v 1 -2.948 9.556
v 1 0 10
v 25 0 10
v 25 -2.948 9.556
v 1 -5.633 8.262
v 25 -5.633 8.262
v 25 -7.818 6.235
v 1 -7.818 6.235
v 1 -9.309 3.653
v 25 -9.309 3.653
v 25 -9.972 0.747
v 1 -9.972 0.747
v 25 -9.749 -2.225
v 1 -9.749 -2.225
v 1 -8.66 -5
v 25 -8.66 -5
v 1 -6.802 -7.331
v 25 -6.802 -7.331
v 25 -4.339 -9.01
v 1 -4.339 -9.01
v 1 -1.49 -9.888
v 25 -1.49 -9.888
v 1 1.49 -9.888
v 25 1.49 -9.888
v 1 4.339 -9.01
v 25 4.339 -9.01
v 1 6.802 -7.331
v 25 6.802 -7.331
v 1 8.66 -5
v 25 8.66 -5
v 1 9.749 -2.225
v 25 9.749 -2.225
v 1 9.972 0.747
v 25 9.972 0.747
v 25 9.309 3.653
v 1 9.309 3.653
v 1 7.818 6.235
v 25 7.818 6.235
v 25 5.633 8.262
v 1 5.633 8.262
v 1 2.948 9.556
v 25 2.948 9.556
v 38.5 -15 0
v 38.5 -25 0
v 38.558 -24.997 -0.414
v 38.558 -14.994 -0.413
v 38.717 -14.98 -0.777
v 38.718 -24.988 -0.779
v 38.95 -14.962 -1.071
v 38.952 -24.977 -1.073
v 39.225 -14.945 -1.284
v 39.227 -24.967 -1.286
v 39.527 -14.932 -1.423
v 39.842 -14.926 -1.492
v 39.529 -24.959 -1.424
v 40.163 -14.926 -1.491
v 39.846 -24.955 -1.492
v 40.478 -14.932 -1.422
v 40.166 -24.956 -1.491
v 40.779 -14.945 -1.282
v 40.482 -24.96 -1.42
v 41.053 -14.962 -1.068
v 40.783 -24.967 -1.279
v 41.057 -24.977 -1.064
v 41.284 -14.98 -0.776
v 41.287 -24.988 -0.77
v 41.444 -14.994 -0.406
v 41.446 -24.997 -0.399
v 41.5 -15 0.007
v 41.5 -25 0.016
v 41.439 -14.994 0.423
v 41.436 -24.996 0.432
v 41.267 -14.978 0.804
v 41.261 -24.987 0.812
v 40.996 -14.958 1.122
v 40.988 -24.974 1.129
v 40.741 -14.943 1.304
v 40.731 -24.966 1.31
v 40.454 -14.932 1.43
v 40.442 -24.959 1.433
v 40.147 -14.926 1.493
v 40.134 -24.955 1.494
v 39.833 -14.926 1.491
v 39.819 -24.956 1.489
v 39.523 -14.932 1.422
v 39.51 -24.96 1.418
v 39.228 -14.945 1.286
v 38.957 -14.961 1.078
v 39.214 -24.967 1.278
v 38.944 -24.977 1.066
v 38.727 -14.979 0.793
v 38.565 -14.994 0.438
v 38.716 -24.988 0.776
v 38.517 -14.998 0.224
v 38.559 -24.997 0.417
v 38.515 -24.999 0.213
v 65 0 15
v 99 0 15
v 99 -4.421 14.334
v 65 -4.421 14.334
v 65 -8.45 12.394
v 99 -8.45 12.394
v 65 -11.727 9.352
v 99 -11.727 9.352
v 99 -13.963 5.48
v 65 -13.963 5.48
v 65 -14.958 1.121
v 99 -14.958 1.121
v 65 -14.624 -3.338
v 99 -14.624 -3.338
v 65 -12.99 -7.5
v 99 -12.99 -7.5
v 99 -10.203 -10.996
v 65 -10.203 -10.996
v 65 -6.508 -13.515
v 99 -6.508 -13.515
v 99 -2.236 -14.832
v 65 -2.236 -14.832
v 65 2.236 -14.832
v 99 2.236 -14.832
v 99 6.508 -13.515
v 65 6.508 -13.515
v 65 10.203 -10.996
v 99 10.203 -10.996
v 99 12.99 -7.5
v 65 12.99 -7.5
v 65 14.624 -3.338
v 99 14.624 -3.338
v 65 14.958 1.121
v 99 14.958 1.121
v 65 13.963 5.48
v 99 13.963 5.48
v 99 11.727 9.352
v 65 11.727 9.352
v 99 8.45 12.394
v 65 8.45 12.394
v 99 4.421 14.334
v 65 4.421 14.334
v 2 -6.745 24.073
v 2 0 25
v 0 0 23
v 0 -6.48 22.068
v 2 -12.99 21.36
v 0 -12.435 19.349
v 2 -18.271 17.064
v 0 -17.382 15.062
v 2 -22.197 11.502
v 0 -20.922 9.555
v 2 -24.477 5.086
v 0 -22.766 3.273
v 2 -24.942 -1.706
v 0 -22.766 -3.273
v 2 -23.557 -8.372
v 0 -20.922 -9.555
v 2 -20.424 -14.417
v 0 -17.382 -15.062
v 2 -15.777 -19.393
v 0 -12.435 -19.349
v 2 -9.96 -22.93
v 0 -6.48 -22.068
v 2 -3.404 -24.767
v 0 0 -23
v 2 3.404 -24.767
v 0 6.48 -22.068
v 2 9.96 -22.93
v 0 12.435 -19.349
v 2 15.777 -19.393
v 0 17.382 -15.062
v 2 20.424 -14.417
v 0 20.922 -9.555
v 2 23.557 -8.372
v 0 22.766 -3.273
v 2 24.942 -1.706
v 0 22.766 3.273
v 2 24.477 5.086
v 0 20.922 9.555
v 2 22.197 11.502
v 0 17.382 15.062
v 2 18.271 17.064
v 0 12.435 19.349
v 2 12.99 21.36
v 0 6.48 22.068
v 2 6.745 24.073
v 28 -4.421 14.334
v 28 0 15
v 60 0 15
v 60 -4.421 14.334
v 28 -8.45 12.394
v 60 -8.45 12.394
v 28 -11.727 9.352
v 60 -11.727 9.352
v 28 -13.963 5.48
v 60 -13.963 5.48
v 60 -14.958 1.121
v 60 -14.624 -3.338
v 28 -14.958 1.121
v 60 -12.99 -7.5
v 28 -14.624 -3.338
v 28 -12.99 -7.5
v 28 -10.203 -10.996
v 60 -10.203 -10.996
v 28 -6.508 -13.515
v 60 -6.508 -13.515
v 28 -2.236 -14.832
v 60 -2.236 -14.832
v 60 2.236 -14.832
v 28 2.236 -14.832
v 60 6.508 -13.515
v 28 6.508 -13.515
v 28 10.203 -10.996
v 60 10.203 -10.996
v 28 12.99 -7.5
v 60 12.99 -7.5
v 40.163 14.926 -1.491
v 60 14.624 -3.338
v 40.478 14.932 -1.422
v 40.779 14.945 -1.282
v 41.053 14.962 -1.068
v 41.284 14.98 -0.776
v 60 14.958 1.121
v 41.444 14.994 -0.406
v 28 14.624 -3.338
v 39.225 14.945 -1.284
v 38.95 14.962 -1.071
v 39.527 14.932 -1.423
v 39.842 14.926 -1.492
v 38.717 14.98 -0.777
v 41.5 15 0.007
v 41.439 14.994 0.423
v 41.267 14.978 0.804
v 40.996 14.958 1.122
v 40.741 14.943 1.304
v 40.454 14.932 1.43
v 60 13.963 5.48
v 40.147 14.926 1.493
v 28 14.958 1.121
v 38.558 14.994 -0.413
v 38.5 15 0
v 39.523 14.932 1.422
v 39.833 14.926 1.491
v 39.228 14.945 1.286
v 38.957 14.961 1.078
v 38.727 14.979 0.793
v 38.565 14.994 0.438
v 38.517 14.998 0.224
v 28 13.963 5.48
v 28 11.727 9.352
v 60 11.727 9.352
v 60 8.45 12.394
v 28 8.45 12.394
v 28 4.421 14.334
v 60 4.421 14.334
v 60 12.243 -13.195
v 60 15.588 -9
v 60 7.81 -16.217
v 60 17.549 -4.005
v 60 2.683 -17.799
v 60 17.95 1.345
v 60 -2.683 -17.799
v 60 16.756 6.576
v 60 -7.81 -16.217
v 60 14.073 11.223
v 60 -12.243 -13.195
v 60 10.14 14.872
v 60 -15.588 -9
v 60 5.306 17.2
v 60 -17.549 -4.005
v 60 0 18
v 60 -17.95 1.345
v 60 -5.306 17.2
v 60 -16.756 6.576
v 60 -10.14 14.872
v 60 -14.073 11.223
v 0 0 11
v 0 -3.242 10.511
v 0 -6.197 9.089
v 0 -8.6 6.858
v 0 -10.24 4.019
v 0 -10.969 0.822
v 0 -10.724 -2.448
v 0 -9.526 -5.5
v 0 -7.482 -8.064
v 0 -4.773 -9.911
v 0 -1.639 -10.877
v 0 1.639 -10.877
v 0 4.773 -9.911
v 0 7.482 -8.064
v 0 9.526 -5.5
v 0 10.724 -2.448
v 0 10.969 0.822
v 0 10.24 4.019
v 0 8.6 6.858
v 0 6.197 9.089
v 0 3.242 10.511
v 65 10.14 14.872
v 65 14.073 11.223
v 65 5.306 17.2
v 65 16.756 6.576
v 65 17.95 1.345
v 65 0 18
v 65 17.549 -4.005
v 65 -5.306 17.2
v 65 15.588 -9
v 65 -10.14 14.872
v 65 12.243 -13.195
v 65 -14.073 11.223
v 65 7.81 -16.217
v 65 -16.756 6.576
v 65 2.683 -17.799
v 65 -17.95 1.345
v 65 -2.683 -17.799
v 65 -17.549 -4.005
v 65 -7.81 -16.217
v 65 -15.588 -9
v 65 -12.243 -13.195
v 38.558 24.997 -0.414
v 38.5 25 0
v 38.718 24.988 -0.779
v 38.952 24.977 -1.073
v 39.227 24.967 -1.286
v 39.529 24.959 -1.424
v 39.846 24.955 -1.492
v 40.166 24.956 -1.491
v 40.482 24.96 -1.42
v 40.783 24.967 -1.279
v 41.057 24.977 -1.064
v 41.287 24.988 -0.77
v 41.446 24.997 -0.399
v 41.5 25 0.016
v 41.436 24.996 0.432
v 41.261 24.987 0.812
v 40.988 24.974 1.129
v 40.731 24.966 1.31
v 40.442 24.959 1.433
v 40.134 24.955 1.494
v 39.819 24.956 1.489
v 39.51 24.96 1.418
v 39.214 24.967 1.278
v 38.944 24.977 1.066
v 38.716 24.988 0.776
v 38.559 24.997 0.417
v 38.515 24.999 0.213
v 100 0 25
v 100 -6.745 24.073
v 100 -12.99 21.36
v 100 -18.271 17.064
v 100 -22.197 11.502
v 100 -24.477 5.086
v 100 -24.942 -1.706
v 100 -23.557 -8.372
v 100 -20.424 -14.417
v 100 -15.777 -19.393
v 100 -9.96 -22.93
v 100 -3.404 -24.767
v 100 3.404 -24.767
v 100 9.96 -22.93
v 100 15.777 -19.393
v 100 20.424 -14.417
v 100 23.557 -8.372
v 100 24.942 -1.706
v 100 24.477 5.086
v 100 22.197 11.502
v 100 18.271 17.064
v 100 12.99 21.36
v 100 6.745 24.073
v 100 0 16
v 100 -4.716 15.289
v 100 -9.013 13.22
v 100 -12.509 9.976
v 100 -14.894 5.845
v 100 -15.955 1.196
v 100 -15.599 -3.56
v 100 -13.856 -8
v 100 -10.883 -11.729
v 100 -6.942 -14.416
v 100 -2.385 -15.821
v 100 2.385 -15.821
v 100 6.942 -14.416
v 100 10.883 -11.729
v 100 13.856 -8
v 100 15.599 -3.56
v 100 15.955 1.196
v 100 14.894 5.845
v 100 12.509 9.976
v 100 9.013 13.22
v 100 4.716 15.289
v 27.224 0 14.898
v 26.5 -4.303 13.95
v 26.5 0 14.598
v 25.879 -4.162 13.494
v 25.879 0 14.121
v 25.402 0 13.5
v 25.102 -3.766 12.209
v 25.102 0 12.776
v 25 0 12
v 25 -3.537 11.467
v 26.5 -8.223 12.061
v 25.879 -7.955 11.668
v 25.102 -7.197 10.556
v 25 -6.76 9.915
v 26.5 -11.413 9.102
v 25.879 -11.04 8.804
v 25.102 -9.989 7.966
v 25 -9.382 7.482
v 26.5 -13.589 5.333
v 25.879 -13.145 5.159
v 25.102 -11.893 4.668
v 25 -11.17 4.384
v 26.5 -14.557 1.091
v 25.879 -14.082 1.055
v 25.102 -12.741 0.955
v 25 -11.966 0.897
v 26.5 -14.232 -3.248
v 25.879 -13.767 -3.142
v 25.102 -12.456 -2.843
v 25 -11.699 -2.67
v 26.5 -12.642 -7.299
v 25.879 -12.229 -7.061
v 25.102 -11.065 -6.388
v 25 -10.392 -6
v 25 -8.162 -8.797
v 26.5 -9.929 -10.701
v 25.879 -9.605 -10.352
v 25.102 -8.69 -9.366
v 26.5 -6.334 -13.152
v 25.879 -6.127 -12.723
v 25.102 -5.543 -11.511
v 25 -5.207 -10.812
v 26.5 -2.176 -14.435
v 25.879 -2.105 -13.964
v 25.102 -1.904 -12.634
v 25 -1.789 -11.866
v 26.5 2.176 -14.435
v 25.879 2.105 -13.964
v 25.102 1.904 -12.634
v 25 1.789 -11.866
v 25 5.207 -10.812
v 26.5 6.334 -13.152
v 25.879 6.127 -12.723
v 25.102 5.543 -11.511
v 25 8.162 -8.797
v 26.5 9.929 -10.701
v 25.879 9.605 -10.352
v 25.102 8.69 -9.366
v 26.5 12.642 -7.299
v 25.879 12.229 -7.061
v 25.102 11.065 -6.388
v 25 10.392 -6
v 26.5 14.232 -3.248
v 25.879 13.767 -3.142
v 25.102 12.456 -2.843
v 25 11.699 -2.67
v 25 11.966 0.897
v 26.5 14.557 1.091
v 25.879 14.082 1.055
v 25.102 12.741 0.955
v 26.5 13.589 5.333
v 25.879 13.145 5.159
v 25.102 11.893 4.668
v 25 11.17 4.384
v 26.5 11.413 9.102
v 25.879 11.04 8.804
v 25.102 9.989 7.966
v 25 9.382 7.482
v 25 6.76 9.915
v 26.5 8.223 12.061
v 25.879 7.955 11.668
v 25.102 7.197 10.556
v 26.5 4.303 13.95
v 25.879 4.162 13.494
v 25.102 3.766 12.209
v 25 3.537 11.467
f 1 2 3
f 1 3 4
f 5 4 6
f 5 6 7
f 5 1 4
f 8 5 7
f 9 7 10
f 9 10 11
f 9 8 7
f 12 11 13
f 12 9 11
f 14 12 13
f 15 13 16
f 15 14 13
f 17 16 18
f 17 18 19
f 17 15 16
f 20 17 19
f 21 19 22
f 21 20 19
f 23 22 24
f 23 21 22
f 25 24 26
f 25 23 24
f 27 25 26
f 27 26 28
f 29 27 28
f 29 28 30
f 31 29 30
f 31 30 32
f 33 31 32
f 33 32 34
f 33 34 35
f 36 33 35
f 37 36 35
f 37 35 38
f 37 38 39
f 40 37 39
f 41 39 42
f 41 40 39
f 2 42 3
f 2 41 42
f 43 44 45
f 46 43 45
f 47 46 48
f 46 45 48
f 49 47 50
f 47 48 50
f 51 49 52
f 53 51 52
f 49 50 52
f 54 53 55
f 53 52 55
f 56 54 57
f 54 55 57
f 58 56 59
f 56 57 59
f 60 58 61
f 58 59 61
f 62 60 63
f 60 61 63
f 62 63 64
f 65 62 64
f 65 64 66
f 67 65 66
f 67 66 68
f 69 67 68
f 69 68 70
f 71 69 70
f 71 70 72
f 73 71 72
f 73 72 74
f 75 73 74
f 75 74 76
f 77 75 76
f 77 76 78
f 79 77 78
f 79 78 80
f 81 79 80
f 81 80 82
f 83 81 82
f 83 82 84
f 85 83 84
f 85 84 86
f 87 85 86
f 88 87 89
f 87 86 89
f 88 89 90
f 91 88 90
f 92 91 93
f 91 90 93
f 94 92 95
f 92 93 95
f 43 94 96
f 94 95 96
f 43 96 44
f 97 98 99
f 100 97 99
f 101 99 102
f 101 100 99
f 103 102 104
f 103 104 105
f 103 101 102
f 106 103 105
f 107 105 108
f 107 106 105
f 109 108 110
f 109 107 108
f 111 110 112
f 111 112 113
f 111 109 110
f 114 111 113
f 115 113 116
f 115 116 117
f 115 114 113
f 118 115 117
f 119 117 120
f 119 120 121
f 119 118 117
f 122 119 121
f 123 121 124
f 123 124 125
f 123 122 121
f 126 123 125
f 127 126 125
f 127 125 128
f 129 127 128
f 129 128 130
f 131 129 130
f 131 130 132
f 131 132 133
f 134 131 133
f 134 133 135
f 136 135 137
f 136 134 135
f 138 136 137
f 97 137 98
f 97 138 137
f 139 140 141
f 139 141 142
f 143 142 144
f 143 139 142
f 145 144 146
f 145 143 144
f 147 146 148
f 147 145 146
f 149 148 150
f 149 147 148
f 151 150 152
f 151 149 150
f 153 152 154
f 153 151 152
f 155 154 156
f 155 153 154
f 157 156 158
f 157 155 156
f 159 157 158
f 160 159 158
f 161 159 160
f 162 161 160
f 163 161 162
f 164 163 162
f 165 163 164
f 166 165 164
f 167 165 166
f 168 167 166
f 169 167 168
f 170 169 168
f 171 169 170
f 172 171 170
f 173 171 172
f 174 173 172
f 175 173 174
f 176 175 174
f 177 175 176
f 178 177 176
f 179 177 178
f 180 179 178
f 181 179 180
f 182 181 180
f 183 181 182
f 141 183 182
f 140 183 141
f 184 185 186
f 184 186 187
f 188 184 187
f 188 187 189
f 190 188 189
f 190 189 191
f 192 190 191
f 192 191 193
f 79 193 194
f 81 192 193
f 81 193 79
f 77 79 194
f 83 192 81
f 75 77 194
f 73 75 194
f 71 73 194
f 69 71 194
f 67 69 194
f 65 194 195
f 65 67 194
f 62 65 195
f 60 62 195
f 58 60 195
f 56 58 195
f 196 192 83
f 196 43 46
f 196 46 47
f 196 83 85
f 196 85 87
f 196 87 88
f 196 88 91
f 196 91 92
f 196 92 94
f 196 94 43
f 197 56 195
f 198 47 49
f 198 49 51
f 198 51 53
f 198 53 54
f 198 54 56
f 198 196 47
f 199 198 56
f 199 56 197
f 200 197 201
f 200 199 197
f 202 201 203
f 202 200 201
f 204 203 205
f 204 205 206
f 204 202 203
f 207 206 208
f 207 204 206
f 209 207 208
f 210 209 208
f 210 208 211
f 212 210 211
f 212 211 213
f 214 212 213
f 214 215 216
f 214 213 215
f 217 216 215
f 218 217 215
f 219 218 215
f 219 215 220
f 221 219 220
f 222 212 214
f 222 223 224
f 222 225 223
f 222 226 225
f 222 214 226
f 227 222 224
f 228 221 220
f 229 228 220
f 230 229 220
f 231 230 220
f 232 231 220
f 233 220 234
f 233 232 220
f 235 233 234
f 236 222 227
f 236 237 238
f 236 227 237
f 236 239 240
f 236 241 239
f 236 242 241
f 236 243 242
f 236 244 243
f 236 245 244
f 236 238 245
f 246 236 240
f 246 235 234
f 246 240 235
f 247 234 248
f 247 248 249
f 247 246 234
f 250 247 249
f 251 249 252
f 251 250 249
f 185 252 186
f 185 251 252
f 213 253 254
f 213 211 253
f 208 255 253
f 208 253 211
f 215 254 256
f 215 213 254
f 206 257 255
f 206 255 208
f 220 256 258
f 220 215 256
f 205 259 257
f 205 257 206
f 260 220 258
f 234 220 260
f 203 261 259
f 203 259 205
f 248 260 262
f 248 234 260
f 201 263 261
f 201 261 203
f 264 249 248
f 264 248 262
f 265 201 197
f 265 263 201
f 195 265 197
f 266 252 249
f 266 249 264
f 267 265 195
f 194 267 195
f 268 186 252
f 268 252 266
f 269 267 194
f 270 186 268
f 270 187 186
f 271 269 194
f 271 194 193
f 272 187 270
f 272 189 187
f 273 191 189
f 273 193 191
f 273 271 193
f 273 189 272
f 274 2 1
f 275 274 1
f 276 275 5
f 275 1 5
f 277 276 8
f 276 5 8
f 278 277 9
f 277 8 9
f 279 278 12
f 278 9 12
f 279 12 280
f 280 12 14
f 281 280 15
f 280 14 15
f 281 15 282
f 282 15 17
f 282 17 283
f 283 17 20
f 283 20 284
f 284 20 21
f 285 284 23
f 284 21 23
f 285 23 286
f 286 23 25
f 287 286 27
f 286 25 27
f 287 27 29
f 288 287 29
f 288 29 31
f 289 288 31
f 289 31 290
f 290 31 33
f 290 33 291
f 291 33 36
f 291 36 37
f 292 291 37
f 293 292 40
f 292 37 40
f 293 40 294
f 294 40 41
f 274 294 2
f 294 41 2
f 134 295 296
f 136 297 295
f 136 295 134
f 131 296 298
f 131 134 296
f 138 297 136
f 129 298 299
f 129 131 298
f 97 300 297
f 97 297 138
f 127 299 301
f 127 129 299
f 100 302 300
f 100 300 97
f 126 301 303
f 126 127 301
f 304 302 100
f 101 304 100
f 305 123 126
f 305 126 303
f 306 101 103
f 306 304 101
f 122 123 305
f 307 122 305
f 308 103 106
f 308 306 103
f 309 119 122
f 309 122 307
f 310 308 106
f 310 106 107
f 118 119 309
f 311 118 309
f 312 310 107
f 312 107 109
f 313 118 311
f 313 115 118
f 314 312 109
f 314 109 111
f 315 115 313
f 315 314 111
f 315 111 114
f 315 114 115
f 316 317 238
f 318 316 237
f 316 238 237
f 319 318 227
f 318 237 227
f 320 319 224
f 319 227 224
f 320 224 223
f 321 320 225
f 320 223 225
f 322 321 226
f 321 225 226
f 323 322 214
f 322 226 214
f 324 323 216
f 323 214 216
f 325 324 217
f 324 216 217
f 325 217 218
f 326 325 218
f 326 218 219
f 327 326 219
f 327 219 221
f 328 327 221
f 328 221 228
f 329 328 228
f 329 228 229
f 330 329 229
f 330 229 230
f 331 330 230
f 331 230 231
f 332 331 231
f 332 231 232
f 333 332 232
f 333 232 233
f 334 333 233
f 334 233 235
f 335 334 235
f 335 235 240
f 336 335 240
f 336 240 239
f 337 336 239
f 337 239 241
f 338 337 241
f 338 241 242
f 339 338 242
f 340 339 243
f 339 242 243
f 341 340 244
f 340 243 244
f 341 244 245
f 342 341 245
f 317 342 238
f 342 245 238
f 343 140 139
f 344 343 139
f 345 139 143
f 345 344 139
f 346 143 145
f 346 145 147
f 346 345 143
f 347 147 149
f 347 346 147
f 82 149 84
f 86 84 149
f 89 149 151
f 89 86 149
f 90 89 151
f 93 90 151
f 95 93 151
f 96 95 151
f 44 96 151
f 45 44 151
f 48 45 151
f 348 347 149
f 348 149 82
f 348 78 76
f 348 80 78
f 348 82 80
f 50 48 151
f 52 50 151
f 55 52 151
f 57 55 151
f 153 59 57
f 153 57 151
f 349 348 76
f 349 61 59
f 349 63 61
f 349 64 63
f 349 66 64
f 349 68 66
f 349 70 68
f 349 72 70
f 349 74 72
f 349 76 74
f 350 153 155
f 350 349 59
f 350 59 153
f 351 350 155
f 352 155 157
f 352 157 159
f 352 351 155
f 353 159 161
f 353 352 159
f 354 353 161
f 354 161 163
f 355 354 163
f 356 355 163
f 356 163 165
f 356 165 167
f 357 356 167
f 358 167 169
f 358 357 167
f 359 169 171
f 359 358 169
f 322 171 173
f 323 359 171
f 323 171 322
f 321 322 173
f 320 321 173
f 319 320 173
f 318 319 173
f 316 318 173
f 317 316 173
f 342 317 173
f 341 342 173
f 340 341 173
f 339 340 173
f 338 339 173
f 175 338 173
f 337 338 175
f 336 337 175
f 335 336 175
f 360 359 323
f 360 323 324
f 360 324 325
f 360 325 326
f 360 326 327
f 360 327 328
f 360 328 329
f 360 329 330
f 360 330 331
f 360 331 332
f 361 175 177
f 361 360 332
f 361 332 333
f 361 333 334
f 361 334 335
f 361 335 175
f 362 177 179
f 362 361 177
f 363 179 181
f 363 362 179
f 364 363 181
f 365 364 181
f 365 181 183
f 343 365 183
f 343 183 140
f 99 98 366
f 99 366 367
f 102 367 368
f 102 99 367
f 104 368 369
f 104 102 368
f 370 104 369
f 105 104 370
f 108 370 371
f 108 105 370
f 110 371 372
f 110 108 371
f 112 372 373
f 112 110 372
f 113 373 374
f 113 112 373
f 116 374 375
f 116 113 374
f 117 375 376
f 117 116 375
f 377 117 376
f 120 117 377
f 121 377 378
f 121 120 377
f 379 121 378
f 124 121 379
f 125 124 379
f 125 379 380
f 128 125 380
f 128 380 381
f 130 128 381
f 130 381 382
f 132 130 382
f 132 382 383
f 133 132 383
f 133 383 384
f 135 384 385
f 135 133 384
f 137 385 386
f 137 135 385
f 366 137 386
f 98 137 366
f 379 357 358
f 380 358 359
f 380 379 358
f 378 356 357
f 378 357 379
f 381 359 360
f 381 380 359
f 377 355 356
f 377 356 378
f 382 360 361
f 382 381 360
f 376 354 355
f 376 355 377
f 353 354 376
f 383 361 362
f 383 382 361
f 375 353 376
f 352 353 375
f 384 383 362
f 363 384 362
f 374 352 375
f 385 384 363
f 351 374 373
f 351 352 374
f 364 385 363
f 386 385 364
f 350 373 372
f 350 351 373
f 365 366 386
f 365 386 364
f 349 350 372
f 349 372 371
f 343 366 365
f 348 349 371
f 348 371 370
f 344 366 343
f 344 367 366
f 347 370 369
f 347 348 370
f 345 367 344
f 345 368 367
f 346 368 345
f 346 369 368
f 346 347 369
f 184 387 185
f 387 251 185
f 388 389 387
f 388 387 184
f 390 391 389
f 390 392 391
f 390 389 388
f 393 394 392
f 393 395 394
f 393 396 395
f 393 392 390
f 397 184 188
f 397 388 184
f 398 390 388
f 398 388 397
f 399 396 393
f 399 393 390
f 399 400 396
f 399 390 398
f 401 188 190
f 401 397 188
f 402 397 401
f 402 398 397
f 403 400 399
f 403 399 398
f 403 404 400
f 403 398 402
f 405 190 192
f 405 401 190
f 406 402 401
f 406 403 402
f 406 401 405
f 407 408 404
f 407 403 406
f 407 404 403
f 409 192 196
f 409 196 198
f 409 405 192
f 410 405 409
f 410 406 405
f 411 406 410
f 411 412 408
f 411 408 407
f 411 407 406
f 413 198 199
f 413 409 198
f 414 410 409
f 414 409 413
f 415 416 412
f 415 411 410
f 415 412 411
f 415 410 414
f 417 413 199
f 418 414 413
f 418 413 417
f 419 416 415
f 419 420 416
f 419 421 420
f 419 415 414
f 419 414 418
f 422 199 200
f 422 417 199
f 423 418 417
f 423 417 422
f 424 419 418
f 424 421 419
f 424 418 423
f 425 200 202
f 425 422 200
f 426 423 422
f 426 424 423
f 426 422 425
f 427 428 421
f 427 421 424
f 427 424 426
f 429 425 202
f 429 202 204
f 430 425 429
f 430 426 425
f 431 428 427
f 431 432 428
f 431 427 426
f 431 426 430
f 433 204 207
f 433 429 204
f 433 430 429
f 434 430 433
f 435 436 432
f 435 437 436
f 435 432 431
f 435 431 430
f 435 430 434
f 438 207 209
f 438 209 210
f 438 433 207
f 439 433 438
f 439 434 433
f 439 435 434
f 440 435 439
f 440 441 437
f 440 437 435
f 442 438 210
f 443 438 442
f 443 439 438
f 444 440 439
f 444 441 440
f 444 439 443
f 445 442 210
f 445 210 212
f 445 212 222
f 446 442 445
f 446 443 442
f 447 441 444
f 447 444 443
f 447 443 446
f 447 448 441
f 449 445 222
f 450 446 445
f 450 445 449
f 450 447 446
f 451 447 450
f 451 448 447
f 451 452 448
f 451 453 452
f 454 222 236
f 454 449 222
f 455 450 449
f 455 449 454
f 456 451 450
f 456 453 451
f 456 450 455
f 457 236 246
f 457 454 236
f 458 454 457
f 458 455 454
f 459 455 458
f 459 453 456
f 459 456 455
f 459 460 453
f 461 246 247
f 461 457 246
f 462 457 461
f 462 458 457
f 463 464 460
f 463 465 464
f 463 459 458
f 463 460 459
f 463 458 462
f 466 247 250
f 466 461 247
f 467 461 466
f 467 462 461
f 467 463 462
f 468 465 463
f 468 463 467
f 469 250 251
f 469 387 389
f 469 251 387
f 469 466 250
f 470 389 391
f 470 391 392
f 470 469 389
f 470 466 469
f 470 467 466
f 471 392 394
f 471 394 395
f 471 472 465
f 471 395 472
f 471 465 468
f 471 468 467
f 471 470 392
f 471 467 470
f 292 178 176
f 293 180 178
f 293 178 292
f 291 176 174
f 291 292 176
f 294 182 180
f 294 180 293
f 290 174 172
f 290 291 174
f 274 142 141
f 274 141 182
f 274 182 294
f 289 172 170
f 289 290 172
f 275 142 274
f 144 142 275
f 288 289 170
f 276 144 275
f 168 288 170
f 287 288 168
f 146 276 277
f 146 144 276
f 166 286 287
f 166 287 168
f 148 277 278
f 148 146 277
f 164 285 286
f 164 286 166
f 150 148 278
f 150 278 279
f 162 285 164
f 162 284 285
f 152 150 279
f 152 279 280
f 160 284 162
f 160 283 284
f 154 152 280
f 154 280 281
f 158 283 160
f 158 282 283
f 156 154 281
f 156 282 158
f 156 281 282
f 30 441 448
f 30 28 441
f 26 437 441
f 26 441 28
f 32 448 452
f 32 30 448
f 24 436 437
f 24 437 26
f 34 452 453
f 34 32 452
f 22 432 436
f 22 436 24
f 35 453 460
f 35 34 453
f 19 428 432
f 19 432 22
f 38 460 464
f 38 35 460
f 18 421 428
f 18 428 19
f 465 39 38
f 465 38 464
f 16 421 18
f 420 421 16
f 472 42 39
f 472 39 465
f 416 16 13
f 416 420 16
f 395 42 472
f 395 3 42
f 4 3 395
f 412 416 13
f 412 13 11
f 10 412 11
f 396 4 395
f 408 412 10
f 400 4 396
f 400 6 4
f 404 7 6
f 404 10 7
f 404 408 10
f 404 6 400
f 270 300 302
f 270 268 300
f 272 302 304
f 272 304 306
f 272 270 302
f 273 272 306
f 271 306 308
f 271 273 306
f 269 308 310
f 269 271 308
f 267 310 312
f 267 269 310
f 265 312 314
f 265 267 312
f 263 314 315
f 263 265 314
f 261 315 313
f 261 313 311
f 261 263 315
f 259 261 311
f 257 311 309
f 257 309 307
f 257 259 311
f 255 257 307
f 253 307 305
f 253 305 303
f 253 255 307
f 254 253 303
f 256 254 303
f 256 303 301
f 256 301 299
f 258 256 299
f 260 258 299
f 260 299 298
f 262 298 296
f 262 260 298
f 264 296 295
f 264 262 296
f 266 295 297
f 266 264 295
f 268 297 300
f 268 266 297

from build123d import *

# Parameters (mm, degrees)
RACCORDO1_R    = 3
SMUSSO1_SIZE   = 2
SMUSSO2_SIZE   = 1
FORO_3_0_3_1_D = 3


with BuildPart() as part:
    # Schizzo2 → Rivoluzione1 (revolve)
    with BuildSketch(Plane.XY, mode=Mode.PRIVATE) as rivoluzione1_sk:
        Polygon((0, 10), (0, 25), (100, 25), (100, 15), (65, 15), (65, 18), (60, 18), (60, 15), (25, 15), (25, 10), align=None)
    revolve(rivoluzione1_sk.sketch.rotate(Axis((0, 0, 0), (1, 0, 0)), 90), axis=Axis((0, 0, 0), (1, 0, 0)))

    # Raccordo1
    raccordo1_edges = [part.edges().sort_by_distance(p)[0] for p in [
        (25, 0, -15),
    ]]
    fillet(raccordo1_edges, radius=RACCORDO1_R)

    # Smusso1
    smusso1_edges = [part.edges().sort_by_distance(p)[0] for p in [
        (0, 0, -25),
    ]]
    chamfer(smusso1_edges, length=SMUSSO1_SIZE)

    # Smusso2
    smusso2_edges = [part.edges().sort_by_distance(p)[0] for p in [
        (100, 0, -15),
        (0, 0, -10),
    ]]
    chamfer(smusso2_edges, length=SMUSSO2_SIZE)

    # Foro Ø3.0 (3)-1 (through all)
    with Locations(Plane(origin=(0, 25, 0), x_dir=(1, 0, 0), z_dir=(0, 1, 0))):
        with Locations((40, 0)):
            Hole(FORO_3_0_3_1_D / 2)


solid = part.part
